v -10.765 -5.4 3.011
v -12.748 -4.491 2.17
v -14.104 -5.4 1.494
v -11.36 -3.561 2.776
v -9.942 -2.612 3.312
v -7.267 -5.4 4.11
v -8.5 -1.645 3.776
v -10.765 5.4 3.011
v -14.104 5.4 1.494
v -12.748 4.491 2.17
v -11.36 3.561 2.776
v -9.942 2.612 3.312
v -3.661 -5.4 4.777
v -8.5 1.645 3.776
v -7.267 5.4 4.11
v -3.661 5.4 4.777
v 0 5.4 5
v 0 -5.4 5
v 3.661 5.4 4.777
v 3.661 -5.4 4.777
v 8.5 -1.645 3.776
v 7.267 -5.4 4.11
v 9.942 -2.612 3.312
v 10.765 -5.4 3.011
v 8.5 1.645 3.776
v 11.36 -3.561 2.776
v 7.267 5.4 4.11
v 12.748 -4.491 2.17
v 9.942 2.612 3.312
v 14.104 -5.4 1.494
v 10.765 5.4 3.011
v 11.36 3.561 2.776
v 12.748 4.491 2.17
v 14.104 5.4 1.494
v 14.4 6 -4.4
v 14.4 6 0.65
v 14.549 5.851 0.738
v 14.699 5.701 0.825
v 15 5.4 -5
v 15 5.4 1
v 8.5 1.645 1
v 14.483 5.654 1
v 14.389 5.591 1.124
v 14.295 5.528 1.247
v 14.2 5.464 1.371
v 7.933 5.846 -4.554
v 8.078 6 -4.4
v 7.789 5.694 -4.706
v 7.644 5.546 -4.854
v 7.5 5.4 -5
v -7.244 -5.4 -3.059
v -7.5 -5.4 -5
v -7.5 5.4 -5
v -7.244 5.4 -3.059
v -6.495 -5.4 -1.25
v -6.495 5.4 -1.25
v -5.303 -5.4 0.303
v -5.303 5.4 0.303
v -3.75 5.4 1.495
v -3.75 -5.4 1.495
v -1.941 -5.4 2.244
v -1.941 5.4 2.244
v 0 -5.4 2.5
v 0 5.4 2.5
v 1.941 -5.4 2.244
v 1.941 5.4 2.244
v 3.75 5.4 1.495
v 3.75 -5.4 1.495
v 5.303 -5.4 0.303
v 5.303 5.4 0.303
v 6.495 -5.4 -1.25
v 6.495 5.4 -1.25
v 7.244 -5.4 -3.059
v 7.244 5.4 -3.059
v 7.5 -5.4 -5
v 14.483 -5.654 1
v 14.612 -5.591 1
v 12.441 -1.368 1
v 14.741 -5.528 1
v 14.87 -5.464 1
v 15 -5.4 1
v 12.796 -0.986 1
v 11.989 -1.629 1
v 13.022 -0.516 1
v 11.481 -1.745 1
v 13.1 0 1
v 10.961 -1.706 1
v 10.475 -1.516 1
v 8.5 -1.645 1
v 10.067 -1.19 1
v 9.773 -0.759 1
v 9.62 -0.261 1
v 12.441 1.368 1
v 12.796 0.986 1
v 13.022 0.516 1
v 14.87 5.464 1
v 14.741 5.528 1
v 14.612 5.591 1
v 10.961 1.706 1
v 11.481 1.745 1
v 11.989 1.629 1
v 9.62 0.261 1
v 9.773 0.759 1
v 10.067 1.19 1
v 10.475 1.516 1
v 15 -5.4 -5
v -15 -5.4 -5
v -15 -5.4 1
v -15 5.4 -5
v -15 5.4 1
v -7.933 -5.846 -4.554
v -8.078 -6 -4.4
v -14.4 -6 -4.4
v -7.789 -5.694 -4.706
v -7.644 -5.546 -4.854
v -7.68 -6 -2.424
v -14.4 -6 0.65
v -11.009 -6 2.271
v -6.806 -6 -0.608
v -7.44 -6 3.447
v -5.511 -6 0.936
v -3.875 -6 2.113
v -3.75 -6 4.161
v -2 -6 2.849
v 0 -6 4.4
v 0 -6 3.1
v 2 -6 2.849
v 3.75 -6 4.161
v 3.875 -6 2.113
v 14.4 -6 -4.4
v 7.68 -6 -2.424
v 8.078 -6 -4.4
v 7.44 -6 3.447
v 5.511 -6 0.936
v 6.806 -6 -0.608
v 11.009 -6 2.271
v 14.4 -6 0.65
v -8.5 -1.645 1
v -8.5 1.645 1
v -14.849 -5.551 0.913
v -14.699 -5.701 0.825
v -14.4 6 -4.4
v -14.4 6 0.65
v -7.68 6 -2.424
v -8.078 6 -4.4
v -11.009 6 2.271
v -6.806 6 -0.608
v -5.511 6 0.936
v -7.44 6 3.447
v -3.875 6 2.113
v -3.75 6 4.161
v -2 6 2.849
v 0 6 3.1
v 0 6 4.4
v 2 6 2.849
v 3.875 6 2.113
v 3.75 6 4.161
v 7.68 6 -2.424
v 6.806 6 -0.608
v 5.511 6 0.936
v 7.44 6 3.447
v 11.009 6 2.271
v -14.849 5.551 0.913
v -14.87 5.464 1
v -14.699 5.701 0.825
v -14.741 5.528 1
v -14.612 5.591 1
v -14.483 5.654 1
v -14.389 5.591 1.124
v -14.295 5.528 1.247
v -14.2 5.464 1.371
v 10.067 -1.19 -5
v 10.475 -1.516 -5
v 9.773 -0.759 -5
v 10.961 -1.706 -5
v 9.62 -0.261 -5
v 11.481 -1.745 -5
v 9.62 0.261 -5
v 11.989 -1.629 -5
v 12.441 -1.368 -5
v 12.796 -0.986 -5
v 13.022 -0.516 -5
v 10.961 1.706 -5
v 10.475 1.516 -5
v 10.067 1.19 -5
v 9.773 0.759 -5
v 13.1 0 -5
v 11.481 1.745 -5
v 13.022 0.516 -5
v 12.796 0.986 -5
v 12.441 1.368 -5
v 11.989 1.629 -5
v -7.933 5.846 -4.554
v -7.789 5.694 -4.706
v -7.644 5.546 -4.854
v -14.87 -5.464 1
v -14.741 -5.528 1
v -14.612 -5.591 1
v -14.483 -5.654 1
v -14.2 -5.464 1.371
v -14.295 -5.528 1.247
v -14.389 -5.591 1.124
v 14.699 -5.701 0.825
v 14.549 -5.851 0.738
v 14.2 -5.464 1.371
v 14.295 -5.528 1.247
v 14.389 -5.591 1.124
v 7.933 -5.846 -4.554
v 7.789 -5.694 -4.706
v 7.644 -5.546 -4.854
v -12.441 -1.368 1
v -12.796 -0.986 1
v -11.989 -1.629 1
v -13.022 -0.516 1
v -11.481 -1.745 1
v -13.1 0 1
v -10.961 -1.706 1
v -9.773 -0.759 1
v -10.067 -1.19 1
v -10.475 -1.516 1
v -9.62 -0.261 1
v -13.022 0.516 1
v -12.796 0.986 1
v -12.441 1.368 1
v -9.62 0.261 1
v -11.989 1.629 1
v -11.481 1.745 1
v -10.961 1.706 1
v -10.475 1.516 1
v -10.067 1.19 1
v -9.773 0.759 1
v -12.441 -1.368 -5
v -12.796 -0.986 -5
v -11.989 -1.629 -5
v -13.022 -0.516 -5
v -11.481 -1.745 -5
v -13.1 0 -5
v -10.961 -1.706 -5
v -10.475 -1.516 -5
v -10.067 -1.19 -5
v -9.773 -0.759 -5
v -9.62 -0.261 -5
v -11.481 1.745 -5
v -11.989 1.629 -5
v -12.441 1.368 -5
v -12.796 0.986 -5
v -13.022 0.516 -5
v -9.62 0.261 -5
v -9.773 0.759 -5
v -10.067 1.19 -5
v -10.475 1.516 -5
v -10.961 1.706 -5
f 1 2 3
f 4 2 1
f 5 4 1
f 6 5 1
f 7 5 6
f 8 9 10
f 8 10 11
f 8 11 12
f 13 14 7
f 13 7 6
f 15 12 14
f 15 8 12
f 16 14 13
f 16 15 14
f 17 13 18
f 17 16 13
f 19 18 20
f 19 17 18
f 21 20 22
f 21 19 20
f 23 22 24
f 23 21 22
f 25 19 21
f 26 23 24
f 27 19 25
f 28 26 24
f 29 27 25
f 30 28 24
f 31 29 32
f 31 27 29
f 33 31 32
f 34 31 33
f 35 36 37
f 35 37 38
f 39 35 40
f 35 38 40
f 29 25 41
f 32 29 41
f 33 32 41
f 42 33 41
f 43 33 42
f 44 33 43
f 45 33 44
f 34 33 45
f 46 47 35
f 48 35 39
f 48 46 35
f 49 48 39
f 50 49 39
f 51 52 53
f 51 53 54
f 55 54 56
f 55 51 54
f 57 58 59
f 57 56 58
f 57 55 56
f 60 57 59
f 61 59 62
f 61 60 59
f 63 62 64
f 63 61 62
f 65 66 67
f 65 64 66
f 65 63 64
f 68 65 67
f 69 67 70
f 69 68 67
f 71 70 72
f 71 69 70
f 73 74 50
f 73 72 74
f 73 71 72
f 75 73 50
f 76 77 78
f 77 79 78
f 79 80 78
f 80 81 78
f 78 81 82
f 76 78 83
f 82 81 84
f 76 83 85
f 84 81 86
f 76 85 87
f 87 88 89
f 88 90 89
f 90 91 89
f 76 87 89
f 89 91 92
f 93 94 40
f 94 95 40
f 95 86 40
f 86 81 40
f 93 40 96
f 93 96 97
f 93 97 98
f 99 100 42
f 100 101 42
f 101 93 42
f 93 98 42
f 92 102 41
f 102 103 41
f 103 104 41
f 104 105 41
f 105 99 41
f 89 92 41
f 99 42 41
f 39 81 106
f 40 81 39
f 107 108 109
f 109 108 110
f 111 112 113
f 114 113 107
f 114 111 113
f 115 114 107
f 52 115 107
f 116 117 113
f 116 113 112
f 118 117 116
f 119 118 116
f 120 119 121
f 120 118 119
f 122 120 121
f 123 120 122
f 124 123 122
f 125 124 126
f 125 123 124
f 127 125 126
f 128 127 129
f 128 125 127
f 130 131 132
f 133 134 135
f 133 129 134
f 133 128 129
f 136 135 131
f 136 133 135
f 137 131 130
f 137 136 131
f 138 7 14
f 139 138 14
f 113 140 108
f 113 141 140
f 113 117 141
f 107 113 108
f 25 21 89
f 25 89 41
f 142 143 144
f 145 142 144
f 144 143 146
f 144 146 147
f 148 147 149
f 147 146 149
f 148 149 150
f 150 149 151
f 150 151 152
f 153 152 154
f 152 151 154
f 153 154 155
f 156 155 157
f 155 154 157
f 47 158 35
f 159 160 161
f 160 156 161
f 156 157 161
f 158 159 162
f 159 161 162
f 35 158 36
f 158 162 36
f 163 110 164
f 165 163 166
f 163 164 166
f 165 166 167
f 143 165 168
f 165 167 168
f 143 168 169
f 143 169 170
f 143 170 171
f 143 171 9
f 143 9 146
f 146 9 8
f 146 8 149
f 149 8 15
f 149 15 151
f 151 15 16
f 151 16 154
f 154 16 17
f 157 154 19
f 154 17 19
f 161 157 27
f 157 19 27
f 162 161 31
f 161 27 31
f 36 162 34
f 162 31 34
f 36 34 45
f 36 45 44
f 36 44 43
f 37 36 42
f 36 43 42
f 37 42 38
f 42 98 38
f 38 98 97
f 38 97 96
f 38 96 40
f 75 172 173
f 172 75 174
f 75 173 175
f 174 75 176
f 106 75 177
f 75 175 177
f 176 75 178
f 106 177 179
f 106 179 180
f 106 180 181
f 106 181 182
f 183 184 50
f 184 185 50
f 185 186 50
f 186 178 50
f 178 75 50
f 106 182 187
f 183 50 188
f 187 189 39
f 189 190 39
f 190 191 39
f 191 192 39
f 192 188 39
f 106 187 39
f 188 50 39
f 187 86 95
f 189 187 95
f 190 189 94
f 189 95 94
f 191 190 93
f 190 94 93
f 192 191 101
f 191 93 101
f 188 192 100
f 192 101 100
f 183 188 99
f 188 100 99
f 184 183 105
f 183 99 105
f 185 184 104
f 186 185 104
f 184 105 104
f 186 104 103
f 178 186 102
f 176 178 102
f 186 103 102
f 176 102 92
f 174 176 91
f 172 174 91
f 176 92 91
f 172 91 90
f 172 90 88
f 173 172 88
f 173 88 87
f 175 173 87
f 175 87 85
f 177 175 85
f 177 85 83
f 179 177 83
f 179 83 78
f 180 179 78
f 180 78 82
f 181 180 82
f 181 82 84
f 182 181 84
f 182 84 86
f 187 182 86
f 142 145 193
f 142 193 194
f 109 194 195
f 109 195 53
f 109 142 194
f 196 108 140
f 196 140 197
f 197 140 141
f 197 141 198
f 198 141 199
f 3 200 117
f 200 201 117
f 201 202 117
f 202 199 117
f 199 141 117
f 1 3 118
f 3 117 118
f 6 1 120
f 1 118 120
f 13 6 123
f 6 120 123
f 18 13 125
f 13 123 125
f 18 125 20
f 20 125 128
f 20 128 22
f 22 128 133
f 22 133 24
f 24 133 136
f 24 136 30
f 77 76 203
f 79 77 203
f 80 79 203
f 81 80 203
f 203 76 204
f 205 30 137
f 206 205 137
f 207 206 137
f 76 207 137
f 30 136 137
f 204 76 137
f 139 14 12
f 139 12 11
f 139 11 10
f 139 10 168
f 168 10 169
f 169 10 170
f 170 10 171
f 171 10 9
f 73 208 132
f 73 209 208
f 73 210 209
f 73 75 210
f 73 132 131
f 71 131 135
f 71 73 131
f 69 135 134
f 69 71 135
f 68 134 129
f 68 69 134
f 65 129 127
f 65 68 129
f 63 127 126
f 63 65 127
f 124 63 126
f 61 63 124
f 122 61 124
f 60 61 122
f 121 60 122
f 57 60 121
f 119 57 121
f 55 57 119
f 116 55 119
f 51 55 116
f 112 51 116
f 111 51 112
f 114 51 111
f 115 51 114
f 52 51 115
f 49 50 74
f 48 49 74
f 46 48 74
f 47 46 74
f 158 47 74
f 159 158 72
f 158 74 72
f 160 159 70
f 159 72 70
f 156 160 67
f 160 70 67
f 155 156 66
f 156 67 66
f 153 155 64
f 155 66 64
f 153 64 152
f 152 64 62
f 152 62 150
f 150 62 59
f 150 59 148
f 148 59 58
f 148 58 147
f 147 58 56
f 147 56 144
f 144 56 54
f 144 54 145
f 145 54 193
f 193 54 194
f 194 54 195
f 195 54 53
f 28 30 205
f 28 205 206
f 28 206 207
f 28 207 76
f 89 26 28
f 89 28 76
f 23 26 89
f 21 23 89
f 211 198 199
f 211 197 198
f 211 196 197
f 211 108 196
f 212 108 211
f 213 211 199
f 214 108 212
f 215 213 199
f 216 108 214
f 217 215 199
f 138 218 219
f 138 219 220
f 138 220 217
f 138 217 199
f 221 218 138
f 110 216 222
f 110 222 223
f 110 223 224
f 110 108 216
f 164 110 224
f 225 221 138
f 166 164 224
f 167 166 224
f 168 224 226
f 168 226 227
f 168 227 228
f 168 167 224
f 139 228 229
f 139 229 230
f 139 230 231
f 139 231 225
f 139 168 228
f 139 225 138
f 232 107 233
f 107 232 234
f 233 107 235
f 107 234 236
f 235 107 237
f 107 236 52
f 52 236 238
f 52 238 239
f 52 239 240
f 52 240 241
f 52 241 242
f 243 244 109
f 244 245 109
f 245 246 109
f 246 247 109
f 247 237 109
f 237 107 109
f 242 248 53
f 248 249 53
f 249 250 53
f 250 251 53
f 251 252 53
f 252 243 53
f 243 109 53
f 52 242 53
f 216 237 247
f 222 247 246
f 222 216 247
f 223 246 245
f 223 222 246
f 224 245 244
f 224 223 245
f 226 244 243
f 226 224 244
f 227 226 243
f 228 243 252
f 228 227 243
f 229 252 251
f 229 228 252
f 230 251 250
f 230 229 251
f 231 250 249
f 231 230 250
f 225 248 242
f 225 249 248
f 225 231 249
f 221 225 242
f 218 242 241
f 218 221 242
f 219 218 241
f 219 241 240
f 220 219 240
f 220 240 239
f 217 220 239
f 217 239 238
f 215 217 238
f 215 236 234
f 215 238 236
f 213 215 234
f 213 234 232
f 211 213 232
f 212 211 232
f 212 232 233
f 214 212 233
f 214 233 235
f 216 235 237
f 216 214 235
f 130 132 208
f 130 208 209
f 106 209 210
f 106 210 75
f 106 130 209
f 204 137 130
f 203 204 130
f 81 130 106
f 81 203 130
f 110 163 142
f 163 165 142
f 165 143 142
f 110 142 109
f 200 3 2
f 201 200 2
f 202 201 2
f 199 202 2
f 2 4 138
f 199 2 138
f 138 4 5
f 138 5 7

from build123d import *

# Parameters (mm, degrees)
ESBO_O1_W                  = 30
ESBO_O1_H                  = 12
RESSALTO_EXTRUS_O1_DEPTH   = 5
CORTE_EXTRUS_O1_DEPTH      = 20.849433241
CORTE_EXTRUS_O1_DEPTH_BACK = 20.849433241
ESBO_O3_R                  = 1.75
CORTE_EXTRUS_O2_DEPTH      = 20
ESBO_O4_R                  = 1.75
CORTE_EXTRUS_O3_DEPTH      = 4
CORTE_EXTRUS_O4_DEPTH      = 20.849433241
CORTE_EXTRUS_O4_DEPTH_BACK = 20.849433241
CHANFRO2_SIZE              = 0.6


with BuildPart() as part:
    # Esboço1 → Ressalto-extrusão1 (new, symmetric)
    with BuildSketch(Plane.XY):
        Rectangle(ESBO_O1_W, ESBO_O1_H)
    extrude(amount=RESSALTO_EXTRUS_O1_DEPTH, both=True)

    # Esboço2 → Corte-extrusão1 (cut, two sides: drawn at the far end of the back side and taken through both)
    with BuildSketch(Plane(origin=(0, 6, 0), x_dir=(1, 0, 0), z_dir=(0, 1, 0)).offset(-CORTE_EXTRUS_O1_DEPTH_BACK)):
        with BuildLine():
            Line((-7.5, 64.244289009), (-7.5, 5))
            ThreePointArc((-7.5, 5), (0, -2.5), (7.5, 5))
            Line((7.5, 5), (7.5, 64.244289009))
            Line((7.5, 64.244289009), (7.5, 182.732867027))
            Line((7.5, 182.732867027), (-7.5, 182.732867027))
            Line((-7.5, 182.732867027), (-7.5, 64.244289009))
        make_face()
    extrude(amount=CORTE_EXTRUS_O1_DEPTH + CORTE_EXTRUS_O1_DEPTH_BACK, mode=Mode.SUBTRACT)

    # Esboço3 → Corte-extrusão2 (cut, through all)
    with BuildSketch(Plane.XY.offset(5)):
        with Locations((11.35, 0)):
            Circle(ESBO_O3_R)
    corte_extrus_o2 = extrude(amount=-CORTE_EXTRUS_O2_DEPTH, mode=Mode.SUBTRACT)

    # Espelhar1: Corte-extrusão2 across plane
    add(corte_extrus_o2.mirror(Plane(origin=(0, 0, 0), x_dir=(0, 0, 1), z_dir=(1, 0, 0))), mode=Mode.SUBTRACT)

    # Esboço4 → Corte-extrusão3 (cut)
    # profile 1 of 2: a face of its own
    with BuildSketch(Plane.XY.offset(5)):
        Polygon((-15, -6), (-8.5, -1.645448267), (-11.35, -3.290896534), (-14.2, -1.645448267), (-14.2, 1.645448267), (-11.35, 3.290896534), (-8.5, 1.645448267), (-15, 6), align=None)
    # profile 2 of 2: a face of its own
    with BuildSketch(Plane.XY.offset(5)):
        Polygon((-11.35, -3.290896534), (-8.5, -1.645448267), (-8.5, 1.645448267), (-11.35, 3.290896534), (-14.2, 1.645448267), (-14.2, -1.645448267), align=None)
        with Locations((-11.35, 0)):
            Circle(ESBO_O4_R, mode=Mode.SUBTRACT)
    corte_extrus_o3 = extrude(amount=-CORTE_EXTRUS_O3_DEPTH, mode=Mode.SUBTRACT)

    # Espelhar2: Corte-extrusão3 across plane
    add(corte_extrus_o3.mirror(Plane(origin=(0, 0, 0), x_dir=(0, 0, 1), z_dir=(1, 0, 0))), mode=Mode.SUBTRACT)

    # Esboço5 → Corte-extrusão4 (cut, two sides: drawn at the far end of the back side and taken through both)
    with BuildSketch(Plane.XZ.offset(6).offset(-CORTE_EXTRUS_O4_DEPTH_BACK)):
        with BuildLine():
            Line((-76.735854523, -34.44642365), (-15, 1))
            ThreePointArc((-15, 1), (0, 5), (15, 1))
            Line((15, 1), (76.735854523, -34.44642365))
            Line((76.735854523, -34.44642365), (76.735854523, 107.930044677))
            Line((76.735854523, 107.930044677), (-76.735854523, 107.930044677))
            Line((-76.735854523, 107.930044677), (-76.735854523, -34.44642365))
        make_face()
    extrude(amount=CORTE_EXTRUS_O4_DEPTH + CORTE_EXTRUS_O4_DEPTH_BACK, mode=Mode.SUBTRACT)

    # Chanfro2
    # the kernel refuses this chamfer: 0.6 mm, written as the material it takes off along each edge
    with BuildSketch(Plane(origin=(-15, 6, -6.543009793), x_dir=(0.9996219169112968, 0.027495876610585904, 0), z_dir=(0, 0, 1)), Plane(origin=(15, 6, 2.543009793), x_dir=(-0.9996219169112968, 0.027495876610585824, 0), z_dir=(0, 0, -1))) as chanfro2_piece_1:
        Polygon((CHANFRO2_SIZE * 0.999621916911, -CHANFRO2_SIZE * 0.0274958766106), (-CHANFRO2_SIZE * 0.0274958766106, -CHANFRO2_SIZE * 0.999621916911), (0, 0), align=None)
    extrude(amount=9.086019586, mode=Mode.SUBTRACT)
    with BuildSketch(Plane(origin=(-16.543009793, 6, -5), x_dir=(0, 0.027495876610585942, 0.9996219169112968), z_dir=(1, 0, 0)), Plane(origin=(5.956990207, 6, -5), x_dir=(0, 0.027495876610585942, 0.9996219169112968), z_dir=(1, 0, 0)), Plane(origin=(16.543009793, -6, -5), x_dir=(0, -0.027495876610585942, 0.9996219169112968), z_dir=(-1, 0, 0)), Plane(origin=(-5.956990207, -6, -5), x_dir=(0, -0.027495876610585942, 0.9996219169112968), z_dir=(-1, 0, 0))) as chanfro2_piece_2:
        Polygon((CHANFRO2_SIZE * 0.999621916911, CHANFRO2_SIZE * 0.0274958766106), (-CHANFRO2_SIZE * 0.0274958766106, CHANFRO2_SIZE * 0.999621916911), (0, 0), align=None)
    extrude(amount=10.586019586, mode=Mode.SUBTRACT)
    with BuildSketch(Plane(origin=(0, 6, -5), x_dir=(0.9788435281484443, 0, -0.20461023288659222), z_dir=(-0.20461023288659222, 0, -0.9788435281484443))) as chanfro2_piece_3:
        Polygon((7.5 + CHANFRO2_SIZE, 0), (7.5, CHANFRO2_SIZE), (7.5, 0), align=None)
    revolve(axis=Axis((0, 6, -5), (0, -1, 0)), revolution_arc=203.613366819, mode=Mode.SUBTRACT)
    with BuildSketch(Plane(origin=(0, 6, -25.125), x_dir=(-0.5416797070080789, 0, 0.8405849719187476), z_dir=(-0.8405849719187476, 0, -0.5416797070080789))) as chanfro2_piece_4:
        Polygon((30.125 - CHANFRO2_SIZE, 0), (30.125, -CHANFRO2_SIZE), (30.125, 0), align=None)
    revolve(axis=Axis((0, 6, -25.125), (0, 1, 0)), revolution_arc=65.596114289, mode=Mode.SUBTRACT)
    with BuildSketch(Plane(origin=(0, -6, -5), x_dir=(0.9788435281484443, 0, -0.20461023288659222), z_dir=(-0.20461023288659222, 0, -0.9788435281484443))) as chanfro2_piece_5:
        Polygon((7.5 + CHANFRO2_SIZE, 0), (7.5, -CHANFRO2_SIZE), (7.5, 0), align=None)
    revolve(axis=Axis((0, -6, -5), (0, -1, 0)), revolution_arc=203.613366819, mode=Mode.SUBTRACT)
    with BuildSketch(Plane(origin=(-15, -6, -6.543009793), x_dir=(0.9996219169112968, -0.027495876610585824, 0), z_dir=(0, 0, 1)), Plane(origin=(15, -6, 2.543009793), x_dir=(-0.9996219169112968, -0.027495876610585904, 0), z_dir=(0, 0, -1))) as chanfro2_piece_6:
        Polygon((CHANFRO2_SIZE * 0.999621916911, CHANFRO2_SIZE * 0.0274958766106), (-CHANFRO2_SIZE * 0.0274958766106, CHANFRO2_SIZE * 0.999621916911), (0, 0), align=None)
    extrude(amount=9.086019586, mode=Mode.SUBTRACT)
    with BuildSketch(Plane(origin=(0, -6, -25.125), x_dir=(-0.5416797070080789, 0, 0.8405849719187476), z_dir=(-0.8405849719187476, 0, -0.5416797070080789))) as chanfro2_piece_7:
        Polygon((30.125, CHANFRO2_SIZE), (30.125 - CHANFRO2_SIZE, 0), (30.125, 0), align=None)
    revolve(axis=Axis((0, -6, -25.125), (0, 1, 0)), revolution_arc=65.596114289, mode=Mode.SUBTRACT)


solid = part.part
